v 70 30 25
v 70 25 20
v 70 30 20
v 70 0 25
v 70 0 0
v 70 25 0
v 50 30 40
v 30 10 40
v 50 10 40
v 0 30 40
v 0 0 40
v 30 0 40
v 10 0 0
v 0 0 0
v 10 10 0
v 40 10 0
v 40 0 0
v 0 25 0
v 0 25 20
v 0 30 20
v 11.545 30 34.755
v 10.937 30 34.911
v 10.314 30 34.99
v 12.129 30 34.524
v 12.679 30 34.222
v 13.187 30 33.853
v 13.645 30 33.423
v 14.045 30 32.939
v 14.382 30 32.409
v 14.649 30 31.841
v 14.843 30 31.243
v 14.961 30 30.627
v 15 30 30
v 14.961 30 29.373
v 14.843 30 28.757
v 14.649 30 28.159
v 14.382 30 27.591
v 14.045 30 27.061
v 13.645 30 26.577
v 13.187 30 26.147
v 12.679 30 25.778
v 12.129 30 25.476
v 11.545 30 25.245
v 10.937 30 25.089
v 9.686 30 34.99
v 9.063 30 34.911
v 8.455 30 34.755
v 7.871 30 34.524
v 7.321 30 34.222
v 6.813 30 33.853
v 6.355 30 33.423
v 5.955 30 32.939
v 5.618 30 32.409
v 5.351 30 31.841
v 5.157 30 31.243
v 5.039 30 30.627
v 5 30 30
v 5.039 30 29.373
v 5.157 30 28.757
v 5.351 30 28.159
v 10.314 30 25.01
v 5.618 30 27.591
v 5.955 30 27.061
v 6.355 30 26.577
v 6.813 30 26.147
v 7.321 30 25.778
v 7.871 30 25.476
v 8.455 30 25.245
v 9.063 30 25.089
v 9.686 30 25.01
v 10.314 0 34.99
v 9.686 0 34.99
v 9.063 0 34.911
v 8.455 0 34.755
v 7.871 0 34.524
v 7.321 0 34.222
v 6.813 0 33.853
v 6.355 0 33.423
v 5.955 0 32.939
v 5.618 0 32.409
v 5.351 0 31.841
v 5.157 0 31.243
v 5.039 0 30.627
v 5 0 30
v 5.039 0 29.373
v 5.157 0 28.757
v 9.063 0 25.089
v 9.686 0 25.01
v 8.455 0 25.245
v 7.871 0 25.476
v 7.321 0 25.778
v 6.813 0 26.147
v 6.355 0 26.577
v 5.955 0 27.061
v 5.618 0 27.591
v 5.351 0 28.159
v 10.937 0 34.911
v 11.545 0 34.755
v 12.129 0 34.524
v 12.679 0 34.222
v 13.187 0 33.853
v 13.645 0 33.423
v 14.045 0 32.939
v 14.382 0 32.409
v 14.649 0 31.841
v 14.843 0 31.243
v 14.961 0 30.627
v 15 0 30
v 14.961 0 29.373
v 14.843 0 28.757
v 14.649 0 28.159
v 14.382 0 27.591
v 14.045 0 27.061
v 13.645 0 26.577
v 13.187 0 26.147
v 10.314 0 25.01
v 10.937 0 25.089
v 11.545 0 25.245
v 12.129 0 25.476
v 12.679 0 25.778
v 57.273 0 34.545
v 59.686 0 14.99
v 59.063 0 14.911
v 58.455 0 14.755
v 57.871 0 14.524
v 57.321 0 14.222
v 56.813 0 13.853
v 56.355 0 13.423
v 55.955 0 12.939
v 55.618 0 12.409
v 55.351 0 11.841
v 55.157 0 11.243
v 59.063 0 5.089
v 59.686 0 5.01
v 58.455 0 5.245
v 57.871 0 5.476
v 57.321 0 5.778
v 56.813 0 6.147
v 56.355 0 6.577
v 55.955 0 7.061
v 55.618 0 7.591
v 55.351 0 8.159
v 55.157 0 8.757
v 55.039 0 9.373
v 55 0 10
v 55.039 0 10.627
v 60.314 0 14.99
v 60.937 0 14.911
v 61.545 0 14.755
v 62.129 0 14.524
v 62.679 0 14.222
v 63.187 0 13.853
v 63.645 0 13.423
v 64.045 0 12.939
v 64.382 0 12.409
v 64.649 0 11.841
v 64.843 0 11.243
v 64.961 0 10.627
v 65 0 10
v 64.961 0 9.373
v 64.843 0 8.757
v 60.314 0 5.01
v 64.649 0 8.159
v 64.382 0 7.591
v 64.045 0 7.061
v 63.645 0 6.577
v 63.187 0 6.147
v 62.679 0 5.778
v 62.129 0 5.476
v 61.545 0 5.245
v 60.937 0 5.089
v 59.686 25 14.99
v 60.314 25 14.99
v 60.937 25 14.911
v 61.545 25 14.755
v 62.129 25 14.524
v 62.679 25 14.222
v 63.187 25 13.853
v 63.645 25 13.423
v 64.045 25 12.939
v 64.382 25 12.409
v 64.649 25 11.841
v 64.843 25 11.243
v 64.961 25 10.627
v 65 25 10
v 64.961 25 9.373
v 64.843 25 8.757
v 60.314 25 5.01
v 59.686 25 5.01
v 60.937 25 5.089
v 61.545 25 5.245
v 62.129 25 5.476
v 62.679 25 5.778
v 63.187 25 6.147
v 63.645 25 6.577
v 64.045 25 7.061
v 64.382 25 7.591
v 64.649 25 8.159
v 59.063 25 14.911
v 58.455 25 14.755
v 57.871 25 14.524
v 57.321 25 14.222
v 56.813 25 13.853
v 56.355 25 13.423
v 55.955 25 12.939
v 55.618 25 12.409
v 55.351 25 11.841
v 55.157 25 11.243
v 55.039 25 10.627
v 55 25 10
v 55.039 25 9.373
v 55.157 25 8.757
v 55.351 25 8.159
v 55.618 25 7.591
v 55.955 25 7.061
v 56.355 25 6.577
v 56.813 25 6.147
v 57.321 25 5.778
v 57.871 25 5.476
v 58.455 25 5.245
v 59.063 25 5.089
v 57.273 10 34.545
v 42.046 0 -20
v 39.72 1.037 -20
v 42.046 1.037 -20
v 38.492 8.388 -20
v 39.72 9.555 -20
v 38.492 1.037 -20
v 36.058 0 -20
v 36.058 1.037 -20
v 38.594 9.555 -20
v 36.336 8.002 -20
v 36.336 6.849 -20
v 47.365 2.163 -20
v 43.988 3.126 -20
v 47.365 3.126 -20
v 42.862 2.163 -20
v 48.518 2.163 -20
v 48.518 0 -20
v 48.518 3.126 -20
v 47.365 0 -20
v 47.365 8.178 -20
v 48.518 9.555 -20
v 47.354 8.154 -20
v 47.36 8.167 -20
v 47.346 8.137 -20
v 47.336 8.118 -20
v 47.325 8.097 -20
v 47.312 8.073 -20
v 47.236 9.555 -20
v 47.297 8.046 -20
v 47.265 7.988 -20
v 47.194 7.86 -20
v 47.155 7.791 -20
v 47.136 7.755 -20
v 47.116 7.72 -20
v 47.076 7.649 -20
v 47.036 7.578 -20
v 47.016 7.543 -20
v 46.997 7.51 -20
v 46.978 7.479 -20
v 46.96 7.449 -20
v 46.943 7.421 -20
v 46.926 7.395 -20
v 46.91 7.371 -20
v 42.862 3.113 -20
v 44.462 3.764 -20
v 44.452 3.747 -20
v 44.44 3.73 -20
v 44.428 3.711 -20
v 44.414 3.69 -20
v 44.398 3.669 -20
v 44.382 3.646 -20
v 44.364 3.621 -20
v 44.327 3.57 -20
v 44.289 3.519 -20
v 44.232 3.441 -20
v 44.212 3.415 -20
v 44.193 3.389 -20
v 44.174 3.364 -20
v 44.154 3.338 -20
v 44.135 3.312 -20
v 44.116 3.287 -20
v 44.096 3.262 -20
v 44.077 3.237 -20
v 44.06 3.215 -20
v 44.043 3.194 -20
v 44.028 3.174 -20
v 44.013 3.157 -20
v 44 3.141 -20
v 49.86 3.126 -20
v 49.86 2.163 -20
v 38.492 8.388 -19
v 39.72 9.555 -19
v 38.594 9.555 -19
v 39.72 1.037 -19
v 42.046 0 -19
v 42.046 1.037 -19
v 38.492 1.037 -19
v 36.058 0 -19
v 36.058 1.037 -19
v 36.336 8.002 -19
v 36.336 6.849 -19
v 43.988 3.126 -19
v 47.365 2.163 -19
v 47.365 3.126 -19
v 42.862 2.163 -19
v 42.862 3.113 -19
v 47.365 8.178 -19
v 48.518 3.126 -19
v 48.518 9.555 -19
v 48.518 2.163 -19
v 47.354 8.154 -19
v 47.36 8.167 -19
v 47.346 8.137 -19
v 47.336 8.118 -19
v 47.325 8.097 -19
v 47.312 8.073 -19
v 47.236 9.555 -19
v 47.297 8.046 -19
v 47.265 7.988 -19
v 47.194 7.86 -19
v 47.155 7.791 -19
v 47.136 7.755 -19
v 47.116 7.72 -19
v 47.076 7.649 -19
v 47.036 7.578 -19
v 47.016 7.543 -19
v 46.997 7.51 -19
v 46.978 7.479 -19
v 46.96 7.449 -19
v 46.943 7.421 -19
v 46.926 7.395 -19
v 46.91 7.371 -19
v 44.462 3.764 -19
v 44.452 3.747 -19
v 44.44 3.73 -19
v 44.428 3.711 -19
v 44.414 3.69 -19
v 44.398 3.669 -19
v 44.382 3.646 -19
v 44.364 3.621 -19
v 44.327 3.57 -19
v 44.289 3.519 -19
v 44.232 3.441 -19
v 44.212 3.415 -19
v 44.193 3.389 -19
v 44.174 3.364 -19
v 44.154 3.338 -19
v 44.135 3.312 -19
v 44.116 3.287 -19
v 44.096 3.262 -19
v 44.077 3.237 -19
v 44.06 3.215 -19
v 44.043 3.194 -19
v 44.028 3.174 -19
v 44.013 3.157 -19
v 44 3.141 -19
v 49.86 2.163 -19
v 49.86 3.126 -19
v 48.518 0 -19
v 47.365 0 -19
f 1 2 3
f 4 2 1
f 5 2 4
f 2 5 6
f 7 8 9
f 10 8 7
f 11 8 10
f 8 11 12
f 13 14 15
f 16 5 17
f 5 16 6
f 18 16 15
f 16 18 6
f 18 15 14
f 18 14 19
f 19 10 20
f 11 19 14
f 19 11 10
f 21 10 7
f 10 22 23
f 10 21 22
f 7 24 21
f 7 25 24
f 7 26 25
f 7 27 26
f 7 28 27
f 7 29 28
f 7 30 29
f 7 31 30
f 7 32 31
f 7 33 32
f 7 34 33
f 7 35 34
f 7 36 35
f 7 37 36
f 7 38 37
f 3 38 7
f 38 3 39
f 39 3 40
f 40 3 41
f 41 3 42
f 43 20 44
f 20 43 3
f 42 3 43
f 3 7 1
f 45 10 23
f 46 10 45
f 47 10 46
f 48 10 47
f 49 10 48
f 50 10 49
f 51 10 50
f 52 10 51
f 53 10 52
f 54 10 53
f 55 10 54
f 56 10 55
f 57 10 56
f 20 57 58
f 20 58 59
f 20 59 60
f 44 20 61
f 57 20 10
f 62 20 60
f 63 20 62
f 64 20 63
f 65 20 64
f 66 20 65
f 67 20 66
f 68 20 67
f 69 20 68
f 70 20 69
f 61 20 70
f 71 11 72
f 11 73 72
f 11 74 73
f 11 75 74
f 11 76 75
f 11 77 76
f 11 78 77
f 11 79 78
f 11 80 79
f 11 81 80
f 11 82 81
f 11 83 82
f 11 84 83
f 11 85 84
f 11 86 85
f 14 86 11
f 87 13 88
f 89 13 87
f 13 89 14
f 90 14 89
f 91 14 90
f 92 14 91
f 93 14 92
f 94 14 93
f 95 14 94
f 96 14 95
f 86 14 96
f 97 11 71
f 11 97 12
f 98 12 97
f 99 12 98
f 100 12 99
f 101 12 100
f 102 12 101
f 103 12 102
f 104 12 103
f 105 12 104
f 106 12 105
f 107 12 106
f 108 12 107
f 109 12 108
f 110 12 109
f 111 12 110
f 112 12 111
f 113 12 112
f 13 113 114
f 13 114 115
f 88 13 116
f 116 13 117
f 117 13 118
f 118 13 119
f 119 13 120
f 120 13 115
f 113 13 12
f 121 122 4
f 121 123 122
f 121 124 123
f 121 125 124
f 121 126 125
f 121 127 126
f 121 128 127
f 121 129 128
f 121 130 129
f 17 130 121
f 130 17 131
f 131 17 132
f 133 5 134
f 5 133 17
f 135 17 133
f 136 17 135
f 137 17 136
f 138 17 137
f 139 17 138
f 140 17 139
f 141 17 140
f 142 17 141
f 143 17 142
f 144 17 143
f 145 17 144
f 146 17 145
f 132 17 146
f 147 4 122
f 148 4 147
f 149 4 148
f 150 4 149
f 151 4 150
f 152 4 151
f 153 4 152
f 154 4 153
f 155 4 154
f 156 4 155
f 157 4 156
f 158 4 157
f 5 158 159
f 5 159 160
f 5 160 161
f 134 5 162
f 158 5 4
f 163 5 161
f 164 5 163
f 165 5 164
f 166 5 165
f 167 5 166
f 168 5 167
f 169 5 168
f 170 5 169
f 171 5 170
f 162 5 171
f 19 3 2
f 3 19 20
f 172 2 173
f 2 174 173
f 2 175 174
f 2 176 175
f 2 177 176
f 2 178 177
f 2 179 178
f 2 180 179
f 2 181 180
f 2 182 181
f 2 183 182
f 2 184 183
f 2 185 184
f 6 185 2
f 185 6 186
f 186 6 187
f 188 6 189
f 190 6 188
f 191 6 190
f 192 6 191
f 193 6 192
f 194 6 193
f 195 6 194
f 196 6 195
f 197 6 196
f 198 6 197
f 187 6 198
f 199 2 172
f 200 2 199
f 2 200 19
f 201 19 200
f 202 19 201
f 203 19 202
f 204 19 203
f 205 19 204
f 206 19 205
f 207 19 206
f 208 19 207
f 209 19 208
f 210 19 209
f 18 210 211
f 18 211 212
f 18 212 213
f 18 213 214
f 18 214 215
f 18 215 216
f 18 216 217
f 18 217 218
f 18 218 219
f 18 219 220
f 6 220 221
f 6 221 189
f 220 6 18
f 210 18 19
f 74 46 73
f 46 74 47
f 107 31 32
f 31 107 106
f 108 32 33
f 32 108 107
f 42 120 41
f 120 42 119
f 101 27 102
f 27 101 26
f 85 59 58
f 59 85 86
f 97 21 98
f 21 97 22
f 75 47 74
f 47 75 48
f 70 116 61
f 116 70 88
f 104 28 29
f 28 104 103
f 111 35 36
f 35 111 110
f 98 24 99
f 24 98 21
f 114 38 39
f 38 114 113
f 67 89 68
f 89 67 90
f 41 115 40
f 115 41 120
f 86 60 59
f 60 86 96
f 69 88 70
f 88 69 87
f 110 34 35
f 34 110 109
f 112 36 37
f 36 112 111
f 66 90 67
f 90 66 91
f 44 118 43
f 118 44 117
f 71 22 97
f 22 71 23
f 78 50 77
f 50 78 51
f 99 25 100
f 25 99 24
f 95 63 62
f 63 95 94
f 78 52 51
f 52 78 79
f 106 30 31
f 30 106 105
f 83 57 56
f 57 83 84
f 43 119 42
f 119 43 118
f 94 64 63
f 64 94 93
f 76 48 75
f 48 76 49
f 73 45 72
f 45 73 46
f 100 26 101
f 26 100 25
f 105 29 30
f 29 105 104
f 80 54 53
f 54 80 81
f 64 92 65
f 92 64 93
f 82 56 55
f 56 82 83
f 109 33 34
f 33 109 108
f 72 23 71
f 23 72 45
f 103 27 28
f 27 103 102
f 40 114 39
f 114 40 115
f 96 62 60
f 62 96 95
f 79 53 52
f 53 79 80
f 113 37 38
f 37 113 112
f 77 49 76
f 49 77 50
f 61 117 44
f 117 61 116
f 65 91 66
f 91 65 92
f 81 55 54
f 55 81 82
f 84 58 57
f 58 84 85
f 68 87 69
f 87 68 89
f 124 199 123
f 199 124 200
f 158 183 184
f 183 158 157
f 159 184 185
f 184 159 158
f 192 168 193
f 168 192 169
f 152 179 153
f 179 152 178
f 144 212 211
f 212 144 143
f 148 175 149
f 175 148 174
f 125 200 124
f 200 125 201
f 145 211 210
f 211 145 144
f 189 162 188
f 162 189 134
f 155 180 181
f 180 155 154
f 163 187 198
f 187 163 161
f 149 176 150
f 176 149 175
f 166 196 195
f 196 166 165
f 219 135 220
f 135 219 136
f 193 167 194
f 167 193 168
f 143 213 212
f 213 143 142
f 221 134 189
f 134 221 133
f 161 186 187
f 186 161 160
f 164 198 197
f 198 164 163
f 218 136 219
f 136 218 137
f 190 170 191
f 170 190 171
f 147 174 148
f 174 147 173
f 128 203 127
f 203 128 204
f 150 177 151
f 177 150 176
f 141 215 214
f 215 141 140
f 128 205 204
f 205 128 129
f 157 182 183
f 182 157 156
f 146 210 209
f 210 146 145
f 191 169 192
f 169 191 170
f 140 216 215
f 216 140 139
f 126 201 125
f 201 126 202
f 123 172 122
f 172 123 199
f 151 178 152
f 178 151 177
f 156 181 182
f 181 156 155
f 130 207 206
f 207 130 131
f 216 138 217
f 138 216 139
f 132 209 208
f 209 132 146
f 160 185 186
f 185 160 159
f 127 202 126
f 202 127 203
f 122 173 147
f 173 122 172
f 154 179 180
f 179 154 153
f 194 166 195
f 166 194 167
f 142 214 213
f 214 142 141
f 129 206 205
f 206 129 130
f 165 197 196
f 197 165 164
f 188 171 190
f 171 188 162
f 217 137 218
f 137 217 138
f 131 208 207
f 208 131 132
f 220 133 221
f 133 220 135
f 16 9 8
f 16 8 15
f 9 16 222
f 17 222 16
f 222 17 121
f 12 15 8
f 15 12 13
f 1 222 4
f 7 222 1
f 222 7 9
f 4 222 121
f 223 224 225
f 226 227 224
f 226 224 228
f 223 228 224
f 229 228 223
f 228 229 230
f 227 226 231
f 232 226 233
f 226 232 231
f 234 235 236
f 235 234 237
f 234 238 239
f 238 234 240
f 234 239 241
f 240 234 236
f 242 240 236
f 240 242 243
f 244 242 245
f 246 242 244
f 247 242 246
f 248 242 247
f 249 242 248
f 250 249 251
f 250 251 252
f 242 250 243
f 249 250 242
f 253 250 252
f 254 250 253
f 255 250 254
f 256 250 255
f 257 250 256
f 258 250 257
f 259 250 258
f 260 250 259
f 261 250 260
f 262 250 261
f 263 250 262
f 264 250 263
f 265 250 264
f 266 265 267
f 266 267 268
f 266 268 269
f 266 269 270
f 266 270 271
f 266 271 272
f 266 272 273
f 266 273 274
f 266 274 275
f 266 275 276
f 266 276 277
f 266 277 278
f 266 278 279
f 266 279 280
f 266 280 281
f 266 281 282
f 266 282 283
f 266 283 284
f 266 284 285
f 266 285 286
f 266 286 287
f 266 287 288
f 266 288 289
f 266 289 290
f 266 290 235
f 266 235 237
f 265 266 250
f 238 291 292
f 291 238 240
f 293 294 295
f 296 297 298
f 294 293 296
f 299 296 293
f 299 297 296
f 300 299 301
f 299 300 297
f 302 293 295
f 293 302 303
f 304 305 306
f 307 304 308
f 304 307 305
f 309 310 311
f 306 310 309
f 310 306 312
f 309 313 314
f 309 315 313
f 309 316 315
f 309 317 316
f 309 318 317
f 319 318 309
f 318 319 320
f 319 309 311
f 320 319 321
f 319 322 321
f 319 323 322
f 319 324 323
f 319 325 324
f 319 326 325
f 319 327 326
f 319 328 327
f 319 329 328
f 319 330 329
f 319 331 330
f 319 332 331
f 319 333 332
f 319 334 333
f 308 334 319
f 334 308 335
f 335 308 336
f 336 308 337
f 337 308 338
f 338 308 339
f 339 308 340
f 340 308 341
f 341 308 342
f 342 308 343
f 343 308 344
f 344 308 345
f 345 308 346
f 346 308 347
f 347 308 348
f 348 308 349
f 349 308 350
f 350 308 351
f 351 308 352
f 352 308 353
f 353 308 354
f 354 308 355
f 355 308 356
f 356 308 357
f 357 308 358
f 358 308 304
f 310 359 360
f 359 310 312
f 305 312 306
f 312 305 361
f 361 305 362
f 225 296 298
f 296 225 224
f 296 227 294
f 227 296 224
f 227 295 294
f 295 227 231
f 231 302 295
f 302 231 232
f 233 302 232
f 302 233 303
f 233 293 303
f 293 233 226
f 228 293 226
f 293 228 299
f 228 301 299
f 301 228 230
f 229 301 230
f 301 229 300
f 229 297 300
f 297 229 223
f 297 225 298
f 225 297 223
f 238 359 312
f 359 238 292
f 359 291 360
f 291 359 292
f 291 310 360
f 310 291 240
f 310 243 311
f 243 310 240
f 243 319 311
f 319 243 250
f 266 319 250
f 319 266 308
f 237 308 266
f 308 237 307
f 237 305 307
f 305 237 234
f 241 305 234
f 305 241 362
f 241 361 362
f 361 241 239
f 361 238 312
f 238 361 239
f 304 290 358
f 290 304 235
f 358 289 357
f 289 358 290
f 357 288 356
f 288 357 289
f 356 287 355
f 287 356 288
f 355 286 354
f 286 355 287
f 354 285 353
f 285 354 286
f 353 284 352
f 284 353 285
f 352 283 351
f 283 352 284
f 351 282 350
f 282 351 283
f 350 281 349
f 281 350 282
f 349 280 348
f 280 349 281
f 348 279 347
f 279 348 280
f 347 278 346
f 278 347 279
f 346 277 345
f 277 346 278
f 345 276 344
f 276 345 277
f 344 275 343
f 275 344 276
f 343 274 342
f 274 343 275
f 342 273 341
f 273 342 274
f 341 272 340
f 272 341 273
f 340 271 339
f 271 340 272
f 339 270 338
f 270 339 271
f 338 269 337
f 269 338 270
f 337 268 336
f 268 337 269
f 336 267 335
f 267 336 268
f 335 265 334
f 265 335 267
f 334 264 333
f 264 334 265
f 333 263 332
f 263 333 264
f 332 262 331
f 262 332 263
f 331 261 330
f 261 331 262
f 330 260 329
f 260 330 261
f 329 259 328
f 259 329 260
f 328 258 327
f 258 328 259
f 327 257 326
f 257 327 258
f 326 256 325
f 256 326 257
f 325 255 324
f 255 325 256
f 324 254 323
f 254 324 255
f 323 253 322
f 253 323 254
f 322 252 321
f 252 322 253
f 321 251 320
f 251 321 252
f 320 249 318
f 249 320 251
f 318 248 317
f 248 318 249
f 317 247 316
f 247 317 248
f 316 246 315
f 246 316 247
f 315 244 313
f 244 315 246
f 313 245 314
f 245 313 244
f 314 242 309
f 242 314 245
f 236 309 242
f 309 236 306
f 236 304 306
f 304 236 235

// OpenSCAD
$fn=50;

cw=70;
cd=30;
ch=40;
cy=10;

difference() {
    cube([cw,cd,ch]);
    translate([0,cd-5,0])
    cube([cw,5,20]);
    translate([10,cd,ch-10])
    rotate([90,0,0])
    cylinder(h=cd,d=cy);
    translate([cw-10,cd,10])
    rotate([90,0,0])
    cylinder(h=cd,d=cy);
    polyhedron(
        points=[ [10,0,0],      //0
                 [10,10,0],     //1
                 [cw-30,10,0],  //2
                 [cw-30,0,0],   //3
                 [30,0,ch],     //4
                 [30,10,ch],    //5
                 [cw-10,10,ch], //6
                 [cw-10,0,ch]   //7
                            ],
        faces=[  [1,0,2],
                 [2,0,3],
                 [4,0,5],
                 [0,1,5],
                 [4,6,7],
                 [6,2,7],
                 [3,4,7],
                 [0,4,3],
                 [4,5,6],
                 [5,2,6],
                 [2,5,1],
                 [2,3,7]
                        ]);
    polyhedron(
        points=[ [50,0,ch],     //0
                 [cw,0,ch],     //1
                 [cw,0,25],     //2
                 [50,cd,ch],    //3
                 [cw,cd,ch],    //4
                 [cw,cd,25] ],  //5
        faces=[  [0,1,2],
                 [1,4,2],
                 [2,4,5],
                 [3,0,5],
                 [2,5,0],
                 [1,0,3],
                 [1,3,4],
                 [4,3,5]]);
}


translate([cw/2,0,-20])
linear_extrude(height=1)
text("14");
